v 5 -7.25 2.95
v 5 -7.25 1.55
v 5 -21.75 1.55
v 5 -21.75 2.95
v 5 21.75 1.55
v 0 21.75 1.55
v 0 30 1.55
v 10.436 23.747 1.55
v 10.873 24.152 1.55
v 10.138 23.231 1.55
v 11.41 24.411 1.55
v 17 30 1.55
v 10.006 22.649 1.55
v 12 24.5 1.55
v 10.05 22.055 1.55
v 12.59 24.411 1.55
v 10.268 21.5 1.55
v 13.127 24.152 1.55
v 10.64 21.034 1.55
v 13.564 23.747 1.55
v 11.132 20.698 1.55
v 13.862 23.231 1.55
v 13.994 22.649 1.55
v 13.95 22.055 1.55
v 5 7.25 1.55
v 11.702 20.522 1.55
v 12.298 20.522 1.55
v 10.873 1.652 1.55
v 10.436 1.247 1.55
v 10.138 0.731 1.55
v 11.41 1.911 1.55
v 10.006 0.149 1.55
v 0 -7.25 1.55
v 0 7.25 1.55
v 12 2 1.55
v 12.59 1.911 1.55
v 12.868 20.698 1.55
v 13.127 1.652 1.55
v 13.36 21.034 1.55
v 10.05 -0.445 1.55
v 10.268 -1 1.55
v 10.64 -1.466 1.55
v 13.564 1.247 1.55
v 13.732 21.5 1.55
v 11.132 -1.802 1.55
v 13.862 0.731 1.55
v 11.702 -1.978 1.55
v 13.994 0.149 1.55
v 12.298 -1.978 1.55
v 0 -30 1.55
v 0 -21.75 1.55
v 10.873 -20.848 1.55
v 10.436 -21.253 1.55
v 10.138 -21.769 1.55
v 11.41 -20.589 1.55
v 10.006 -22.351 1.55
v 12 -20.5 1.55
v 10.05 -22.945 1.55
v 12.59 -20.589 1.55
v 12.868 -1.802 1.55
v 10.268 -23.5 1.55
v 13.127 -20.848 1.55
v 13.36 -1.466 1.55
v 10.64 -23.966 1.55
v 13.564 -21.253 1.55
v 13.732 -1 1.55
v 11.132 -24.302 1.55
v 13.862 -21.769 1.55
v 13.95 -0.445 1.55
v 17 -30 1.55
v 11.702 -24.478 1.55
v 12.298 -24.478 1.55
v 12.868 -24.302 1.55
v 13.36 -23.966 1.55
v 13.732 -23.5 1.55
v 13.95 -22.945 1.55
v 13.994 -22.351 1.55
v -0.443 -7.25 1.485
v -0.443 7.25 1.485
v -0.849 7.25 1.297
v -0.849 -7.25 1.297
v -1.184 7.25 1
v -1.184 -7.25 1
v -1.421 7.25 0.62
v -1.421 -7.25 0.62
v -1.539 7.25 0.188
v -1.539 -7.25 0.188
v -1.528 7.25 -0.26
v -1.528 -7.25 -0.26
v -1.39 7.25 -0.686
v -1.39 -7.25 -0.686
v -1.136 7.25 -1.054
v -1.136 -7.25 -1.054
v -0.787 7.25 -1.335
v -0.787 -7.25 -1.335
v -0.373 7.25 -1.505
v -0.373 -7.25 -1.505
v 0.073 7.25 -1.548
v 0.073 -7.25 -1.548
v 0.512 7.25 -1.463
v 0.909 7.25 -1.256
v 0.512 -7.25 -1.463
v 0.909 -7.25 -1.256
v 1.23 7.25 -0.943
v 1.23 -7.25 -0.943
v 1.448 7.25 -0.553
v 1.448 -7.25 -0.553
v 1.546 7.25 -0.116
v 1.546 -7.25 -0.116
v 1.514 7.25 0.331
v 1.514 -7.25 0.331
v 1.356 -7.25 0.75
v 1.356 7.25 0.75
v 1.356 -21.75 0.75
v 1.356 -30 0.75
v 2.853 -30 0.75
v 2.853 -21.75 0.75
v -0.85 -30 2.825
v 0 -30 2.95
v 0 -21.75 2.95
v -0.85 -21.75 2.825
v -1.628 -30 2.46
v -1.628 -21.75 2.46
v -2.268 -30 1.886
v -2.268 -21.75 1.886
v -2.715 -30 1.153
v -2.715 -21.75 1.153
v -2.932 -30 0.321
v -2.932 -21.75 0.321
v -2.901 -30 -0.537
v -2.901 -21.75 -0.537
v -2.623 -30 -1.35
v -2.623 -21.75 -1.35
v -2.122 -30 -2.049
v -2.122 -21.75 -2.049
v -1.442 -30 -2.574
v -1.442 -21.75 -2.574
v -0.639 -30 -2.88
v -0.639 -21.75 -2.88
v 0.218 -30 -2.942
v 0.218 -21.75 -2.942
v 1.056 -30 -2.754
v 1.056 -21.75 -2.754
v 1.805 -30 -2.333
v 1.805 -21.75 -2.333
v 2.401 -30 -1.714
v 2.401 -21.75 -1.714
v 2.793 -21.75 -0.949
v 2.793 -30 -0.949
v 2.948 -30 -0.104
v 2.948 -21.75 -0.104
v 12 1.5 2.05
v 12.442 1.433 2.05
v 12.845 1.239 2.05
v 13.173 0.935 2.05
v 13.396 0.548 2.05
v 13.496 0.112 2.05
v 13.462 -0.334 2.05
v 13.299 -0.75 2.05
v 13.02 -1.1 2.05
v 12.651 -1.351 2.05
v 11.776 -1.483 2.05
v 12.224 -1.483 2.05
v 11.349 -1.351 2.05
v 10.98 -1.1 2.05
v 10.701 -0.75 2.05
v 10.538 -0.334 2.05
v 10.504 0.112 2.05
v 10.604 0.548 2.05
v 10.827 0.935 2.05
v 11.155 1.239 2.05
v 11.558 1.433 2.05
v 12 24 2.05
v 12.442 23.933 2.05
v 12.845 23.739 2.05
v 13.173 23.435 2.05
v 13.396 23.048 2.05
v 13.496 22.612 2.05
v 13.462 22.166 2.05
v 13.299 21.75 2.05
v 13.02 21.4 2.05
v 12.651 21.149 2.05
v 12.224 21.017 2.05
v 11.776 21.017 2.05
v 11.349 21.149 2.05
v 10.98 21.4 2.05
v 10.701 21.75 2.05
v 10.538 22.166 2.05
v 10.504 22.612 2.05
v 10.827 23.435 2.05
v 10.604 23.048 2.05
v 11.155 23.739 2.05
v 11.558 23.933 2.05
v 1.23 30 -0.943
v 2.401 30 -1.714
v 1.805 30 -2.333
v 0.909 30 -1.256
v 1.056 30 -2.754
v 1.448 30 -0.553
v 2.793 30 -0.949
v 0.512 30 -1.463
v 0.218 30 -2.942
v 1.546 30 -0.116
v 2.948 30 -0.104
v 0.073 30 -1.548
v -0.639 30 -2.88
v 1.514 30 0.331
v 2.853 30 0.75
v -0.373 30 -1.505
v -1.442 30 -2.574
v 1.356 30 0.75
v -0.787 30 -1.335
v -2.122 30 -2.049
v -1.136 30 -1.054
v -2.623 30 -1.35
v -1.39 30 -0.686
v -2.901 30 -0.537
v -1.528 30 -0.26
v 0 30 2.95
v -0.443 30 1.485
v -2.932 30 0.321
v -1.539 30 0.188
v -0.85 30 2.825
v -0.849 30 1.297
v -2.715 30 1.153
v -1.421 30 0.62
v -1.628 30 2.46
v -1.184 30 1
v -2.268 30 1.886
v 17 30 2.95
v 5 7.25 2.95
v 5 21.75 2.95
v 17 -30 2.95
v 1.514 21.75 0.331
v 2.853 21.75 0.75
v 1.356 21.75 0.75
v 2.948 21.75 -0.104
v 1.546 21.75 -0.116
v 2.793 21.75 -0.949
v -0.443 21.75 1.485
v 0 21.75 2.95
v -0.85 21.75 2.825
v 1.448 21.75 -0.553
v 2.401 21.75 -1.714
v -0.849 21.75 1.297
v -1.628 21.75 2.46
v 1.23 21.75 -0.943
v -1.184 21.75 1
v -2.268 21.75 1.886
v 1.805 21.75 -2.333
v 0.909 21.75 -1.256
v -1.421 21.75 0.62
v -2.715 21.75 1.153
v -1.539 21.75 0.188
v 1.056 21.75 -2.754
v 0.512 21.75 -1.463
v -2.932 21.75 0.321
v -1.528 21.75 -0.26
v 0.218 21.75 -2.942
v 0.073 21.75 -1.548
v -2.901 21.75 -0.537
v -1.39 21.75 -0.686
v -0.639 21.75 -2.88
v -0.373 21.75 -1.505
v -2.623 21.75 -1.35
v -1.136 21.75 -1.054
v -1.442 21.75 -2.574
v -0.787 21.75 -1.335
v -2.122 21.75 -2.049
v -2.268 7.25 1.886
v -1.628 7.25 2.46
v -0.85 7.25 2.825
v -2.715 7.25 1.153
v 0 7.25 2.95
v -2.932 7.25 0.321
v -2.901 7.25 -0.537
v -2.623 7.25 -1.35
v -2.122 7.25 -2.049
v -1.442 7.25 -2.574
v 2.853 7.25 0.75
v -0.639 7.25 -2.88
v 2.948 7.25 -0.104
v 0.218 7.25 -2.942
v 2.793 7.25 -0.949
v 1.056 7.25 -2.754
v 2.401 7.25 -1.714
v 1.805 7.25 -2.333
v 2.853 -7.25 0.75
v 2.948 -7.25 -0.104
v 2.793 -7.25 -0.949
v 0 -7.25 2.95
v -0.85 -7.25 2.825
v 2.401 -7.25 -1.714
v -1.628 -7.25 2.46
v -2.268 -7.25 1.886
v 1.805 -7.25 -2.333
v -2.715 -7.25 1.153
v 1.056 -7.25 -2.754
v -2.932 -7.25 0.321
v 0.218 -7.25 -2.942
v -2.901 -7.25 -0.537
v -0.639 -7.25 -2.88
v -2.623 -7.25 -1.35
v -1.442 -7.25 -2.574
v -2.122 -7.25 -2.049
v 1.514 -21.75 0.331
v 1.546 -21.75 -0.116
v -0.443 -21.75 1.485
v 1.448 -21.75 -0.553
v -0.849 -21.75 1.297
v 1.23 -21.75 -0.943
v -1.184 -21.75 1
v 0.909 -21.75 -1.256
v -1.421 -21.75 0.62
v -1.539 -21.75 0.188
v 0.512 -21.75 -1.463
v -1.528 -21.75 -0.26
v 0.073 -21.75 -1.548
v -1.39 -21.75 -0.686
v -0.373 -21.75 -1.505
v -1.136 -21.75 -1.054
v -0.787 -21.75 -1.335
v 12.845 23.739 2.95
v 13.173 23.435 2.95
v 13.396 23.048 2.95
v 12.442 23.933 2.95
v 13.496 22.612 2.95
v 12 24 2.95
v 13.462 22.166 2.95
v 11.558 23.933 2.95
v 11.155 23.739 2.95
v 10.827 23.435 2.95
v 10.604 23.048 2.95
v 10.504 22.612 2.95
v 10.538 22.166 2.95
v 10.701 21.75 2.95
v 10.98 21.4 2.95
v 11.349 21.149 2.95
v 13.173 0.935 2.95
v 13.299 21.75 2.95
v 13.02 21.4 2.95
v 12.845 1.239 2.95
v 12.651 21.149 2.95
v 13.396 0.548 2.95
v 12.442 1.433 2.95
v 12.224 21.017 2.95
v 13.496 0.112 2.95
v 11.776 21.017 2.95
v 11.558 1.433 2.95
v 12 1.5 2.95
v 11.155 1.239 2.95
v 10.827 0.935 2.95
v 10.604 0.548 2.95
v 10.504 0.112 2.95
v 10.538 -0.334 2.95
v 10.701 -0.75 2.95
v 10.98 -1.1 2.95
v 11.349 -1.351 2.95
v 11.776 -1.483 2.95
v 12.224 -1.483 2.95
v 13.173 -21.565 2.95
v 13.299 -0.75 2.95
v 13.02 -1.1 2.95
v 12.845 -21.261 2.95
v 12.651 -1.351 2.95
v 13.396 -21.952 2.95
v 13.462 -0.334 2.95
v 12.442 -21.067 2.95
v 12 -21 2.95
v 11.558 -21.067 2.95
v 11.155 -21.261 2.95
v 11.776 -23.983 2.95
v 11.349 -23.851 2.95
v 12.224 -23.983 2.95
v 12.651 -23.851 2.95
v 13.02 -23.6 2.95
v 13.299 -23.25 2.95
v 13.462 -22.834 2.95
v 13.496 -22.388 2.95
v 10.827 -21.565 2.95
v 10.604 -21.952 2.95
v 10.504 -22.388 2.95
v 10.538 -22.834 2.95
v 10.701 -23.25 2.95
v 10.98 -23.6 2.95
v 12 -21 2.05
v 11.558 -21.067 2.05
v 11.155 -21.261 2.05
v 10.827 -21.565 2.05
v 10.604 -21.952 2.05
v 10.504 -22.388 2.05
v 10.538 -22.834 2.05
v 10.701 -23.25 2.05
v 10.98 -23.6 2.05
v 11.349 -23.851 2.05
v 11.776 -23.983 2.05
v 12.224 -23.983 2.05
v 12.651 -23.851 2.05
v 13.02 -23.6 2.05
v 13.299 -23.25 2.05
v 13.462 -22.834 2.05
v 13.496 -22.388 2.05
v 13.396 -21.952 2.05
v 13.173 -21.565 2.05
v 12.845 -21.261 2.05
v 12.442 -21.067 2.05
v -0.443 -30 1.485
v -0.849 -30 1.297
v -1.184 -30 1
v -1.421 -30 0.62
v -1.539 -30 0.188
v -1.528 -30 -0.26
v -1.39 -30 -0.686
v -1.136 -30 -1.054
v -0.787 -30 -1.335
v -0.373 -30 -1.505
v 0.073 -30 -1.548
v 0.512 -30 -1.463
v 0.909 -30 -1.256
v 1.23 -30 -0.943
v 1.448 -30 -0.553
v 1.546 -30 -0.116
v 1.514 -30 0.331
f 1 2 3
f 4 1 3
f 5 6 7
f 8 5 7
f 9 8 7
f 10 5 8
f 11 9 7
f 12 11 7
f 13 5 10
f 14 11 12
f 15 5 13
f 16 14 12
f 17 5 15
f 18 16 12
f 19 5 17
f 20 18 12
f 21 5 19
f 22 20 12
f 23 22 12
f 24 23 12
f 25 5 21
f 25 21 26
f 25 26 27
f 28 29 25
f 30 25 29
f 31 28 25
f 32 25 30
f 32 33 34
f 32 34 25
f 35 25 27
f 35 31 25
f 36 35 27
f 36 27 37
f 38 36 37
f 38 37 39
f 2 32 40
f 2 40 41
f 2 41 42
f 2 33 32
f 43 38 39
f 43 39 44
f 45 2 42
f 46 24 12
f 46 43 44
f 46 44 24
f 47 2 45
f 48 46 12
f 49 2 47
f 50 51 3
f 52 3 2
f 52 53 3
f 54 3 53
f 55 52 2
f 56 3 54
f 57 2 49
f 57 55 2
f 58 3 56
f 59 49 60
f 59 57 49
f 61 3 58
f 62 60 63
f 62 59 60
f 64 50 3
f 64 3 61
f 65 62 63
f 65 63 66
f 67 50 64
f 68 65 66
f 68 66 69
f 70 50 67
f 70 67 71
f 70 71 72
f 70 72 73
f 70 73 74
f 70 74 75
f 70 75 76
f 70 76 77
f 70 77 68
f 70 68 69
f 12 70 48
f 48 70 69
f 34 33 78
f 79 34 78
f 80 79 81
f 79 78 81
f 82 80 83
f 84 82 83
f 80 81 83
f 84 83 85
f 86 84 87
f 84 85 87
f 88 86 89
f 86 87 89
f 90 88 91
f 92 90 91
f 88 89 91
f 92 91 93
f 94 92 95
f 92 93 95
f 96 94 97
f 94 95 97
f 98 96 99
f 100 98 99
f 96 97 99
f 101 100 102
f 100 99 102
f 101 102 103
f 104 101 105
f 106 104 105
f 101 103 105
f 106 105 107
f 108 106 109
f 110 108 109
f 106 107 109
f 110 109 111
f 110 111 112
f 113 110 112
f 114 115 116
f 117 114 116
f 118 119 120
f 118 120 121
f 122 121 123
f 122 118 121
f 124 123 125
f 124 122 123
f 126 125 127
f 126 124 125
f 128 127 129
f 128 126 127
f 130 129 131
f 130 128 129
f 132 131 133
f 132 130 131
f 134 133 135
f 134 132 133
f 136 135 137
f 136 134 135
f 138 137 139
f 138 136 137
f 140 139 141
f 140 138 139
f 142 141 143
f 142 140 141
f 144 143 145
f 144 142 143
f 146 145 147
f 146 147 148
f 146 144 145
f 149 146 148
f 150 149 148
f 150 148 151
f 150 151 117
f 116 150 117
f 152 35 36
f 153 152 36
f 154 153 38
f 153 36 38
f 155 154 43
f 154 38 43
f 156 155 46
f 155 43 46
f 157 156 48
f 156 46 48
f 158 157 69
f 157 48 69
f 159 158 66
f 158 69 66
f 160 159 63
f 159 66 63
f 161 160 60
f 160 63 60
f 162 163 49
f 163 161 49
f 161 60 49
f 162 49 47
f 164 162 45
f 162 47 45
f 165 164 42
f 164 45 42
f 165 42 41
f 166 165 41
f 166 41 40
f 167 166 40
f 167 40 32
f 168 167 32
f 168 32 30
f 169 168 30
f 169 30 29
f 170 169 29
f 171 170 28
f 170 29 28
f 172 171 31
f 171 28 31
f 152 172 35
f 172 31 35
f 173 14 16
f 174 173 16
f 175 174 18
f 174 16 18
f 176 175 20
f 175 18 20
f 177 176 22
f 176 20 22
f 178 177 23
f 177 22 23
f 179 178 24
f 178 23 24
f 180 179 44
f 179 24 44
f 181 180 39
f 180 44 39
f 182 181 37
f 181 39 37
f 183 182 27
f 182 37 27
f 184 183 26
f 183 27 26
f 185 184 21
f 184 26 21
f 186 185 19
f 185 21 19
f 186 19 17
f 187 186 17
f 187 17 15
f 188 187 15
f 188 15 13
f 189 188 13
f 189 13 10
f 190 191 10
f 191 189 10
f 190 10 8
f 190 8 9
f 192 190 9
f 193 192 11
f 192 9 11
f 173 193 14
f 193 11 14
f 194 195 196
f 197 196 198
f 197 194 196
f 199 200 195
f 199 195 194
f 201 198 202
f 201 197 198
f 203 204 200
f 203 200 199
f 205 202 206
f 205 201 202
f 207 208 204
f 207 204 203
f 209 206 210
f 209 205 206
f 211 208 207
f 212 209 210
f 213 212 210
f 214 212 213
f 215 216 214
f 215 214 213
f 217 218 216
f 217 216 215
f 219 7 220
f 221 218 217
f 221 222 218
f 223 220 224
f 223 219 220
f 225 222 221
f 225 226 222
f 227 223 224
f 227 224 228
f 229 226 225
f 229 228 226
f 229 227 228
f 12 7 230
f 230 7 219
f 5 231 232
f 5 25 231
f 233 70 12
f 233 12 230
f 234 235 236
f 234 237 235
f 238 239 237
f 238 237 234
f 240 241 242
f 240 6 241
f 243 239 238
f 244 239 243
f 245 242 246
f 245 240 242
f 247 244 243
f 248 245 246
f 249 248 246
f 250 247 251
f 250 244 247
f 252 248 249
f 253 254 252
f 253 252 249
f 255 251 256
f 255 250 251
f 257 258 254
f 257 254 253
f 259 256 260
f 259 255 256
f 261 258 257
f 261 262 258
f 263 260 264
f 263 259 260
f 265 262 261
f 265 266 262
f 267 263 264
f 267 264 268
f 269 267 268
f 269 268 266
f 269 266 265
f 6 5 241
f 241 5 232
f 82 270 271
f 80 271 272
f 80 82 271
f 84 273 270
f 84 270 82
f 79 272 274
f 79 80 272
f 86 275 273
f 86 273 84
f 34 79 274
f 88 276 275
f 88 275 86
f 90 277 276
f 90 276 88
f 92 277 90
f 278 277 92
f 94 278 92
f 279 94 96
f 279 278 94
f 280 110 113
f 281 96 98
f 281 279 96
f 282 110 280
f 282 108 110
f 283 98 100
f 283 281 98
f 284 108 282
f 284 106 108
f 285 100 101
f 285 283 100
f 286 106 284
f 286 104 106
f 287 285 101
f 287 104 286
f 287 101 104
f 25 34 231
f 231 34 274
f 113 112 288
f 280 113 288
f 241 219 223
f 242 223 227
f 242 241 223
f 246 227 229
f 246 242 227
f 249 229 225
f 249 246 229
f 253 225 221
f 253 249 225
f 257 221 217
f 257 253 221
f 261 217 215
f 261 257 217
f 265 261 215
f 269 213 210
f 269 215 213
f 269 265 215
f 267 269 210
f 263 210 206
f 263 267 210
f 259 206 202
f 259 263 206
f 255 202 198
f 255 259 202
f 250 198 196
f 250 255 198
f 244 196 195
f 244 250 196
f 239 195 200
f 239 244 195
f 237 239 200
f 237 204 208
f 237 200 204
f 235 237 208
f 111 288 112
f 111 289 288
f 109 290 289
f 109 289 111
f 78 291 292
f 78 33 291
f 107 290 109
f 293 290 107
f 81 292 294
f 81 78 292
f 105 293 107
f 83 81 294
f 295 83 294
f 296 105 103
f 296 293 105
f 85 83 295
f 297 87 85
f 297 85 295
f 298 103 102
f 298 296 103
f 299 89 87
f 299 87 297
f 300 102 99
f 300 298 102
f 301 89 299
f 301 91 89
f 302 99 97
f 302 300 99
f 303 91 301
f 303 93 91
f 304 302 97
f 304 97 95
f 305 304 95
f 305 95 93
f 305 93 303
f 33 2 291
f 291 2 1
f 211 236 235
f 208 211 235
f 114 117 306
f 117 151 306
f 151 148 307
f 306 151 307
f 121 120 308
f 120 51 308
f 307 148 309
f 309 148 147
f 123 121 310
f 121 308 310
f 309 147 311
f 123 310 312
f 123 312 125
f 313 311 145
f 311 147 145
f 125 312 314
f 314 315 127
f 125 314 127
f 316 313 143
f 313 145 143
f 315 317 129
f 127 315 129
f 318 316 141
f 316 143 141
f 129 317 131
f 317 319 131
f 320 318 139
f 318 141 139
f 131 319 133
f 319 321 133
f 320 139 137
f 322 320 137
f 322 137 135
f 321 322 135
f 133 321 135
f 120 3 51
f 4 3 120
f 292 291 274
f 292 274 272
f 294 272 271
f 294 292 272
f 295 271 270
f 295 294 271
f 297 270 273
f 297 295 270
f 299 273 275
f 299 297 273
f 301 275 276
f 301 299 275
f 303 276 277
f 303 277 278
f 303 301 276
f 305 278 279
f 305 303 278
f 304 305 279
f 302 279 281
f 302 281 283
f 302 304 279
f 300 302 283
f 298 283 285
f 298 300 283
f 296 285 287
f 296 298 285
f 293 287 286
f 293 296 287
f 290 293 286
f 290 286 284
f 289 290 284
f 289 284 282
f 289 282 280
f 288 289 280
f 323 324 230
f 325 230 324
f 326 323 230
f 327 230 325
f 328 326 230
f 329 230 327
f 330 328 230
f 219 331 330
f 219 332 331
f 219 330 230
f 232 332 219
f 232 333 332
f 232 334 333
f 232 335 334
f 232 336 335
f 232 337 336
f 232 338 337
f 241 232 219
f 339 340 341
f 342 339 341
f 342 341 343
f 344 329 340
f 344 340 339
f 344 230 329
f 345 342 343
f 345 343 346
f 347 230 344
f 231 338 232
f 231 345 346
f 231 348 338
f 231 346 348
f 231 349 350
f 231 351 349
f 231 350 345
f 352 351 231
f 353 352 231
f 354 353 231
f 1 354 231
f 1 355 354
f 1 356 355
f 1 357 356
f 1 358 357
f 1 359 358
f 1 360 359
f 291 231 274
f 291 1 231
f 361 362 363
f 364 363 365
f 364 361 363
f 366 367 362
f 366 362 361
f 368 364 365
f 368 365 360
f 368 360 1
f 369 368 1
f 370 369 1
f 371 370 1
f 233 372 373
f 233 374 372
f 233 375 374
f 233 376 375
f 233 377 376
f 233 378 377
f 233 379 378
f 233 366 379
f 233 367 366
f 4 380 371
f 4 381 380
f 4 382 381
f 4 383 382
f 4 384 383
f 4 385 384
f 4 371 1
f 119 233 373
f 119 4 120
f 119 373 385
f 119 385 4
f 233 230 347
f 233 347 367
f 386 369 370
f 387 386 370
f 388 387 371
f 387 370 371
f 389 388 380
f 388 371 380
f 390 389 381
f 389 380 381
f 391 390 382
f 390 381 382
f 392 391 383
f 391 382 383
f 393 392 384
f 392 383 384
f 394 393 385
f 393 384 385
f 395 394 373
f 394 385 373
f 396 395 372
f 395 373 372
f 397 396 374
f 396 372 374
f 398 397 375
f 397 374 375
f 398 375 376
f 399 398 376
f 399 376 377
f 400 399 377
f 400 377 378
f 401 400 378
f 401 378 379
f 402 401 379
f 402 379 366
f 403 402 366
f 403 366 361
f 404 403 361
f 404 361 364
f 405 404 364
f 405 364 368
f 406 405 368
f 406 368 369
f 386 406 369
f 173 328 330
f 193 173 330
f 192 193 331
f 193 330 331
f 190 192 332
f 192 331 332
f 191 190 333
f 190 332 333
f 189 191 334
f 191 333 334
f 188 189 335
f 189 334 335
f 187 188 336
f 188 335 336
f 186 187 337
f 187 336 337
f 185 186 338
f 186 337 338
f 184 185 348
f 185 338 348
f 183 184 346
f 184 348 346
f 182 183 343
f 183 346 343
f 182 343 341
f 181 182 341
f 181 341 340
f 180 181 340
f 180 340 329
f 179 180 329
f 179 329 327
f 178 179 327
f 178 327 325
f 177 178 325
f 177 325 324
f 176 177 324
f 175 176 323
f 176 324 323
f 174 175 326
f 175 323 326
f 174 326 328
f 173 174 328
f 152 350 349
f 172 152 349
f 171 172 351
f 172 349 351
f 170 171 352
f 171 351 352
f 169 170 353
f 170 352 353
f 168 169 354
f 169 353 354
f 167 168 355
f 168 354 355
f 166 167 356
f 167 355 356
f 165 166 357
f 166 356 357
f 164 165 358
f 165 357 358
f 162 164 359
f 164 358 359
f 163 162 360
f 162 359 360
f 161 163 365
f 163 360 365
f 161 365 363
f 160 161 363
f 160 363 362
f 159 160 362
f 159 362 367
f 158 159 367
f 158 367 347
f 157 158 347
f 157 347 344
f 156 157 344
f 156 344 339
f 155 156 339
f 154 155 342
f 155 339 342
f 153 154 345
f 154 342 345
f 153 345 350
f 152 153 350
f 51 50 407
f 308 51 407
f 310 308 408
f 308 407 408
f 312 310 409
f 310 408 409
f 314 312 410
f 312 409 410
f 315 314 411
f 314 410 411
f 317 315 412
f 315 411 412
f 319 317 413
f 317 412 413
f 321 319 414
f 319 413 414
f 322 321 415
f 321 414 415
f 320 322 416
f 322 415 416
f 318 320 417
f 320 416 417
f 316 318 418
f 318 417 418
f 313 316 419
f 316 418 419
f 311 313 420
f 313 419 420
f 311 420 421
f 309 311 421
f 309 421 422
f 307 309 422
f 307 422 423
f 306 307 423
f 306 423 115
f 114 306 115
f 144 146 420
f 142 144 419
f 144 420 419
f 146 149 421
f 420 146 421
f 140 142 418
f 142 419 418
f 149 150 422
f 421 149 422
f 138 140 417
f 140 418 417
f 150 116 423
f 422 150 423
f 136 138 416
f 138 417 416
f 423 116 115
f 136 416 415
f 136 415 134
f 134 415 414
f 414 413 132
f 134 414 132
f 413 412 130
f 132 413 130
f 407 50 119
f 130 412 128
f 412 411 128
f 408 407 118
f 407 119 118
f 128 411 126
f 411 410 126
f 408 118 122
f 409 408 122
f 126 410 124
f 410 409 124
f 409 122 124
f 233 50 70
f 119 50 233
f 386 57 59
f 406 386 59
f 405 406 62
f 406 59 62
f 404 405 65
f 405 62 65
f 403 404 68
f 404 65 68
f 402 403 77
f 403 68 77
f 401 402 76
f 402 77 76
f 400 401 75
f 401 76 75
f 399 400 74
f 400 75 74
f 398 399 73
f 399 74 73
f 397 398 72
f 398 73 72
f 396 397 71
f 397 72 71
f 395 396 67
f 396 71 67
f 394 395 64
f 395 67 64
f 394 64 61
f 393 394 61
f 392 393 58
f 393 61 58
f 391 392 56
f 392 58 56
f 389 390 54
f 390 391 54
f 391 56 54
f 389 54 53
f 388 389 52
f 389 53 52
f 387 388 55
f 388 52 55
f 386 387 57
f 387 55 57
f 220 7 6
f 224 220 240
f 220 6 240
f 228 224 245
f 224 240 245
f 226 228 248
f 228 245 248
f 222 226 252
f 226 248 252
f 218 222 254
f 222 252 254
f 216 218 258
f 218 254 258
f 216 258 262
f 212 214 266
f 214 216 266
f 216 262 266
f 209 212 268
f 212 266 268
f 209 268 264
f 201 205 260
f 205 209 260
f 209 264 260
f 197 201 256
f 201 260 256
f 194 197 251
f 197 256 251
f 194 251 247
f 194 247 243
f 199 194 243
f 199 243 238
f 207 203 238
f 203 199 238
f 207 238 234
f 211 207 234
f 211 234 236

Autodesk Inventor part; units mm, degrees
ref_plane "YZ Plane" through (0, 0, 0) normal (1, 0, 0) x (0, 1, 0)
ref_plane "XZ Plane" through (0, 0, 0) normal (0, 1, 0) x (-1, 0, 0)
ref_plane "XY Plane" through (0, 0, 0) normal (0, 0, 1) x (1, 0, 0)
sketch "Skizze1" plane through (0, 0, 0) normal (0, 1, 0) x (-1, 0, 0)
  line L0 (0, 0) -> (0, 79.9753) construction
  line L1 (0, 0) -> (-80.4332, 0) construction
  line L2 (0, 0) -> (80.1339, 0) construction
  line L3 (0, 0) -> (0, -79.3949) construction
  line L4 (0, 1.55) -> (-17, 1.55)
  line L5 (-17, 1.55) -> (-17, 2.95)
  line L6 (-17, 2.95) -> (0, 2.95)
  arc A0 (-1.3565, 0.75) -> (0, 1.55) centre (0, 0) ccw
  arc A1 (-2.8531, 0.75) -> (0, 2.95) centre (0, 0) ccw
  line L7 (-1.3565, 0.75) -> (-2.8531, 0.75)
  circle A2 centre (0, 0) radius 1.5
  dimension "d0" = 1.4
  dimension "d1" = 5.9
  dimension "d2" = 0.8
  dimension "d3" = 19.95
  dimension "d21" = 0.05
  dimension "d28" = 17
extrude "Extrusion1" add sketch "Skizze1" along normal mid plane 60 contours L4 L5 L6 A1 L7 A0
sketch "Skizze3" plane through (0, 0, 0) normal (0, 0, 1) x (1, 0, 0)
  line L0 (7.5, -7.25) -> (-7, -7.25)
  line L1 (-7, -7.25) -> (-7, 7.25)
  line L2 (-7, 7.25) -> (7.5, 7.25)
  line L3 (7.5, 7.25) -> (7.5, -7.25)
  line L4 (17, 30) -> (17, -30) construction
  line L5 (-11.8, 0) -> (21.8, 0) construction
  line L6 (-7, -7.25) -> (5, -7.25)
  line L7 (5, -7.25) -> (5, -21.75)
  line L8 (5, -21.75) -> (-7, -21.75)
  line L9 (-7, -21.75) -> (-7, -7.25)
  line L10 (-7, 7.25) -> (5, 7.25)
  line L11 (5, 7.25) -> (5, 21.75)
  line L12 (5, 21.75) -> (-7, 21.75)
  line L13 (-7, 21.75) -> (-7, 7.25)
  point P0 (0, 0)
  dimension "d6" = 9.5
  dimension "d7" = 14.5
  dimension "d8" = 7.25
  dimension "d9" = 14.5
  dimension "d27" = 12
extrude "Extrusion2" cut sketch "Skizze3" along normal through all both and the other way through all contours L7 L8 L9 L0 | L2 L13 L12 L11
sketch "Skizze4" plane through (17, 30, 1.55) normal (0, 0, -1) x (-1, 0, 0)
  line L0 (17, -72) -> (17, 12) projected
  line L1 (-3.99, -30) -> (23.94, -30) construction
  line L2 (5, -7.5) -> (5, -52.5) construction
  line L3 (0, 0) -> (0, -60) construction
  point P0 (17, -30)
  point P1 (5, -30)
  dimension "d12" = 45
  dimension "d13" = 5
hole "Bohrung1" at (12, 22.5, 1.55) at (12, -22.5, 1.55) at (12, 0, 1.55) direction (0, 0, 1) diameter 3 end through all countersink diameter 4 countersink angle 90
extrude "Extrusion3" [suppressed]
chamfer "Fase1" [suppressed]
equation "\"d8\" = 0.5 * d7"
equation "\"d9\" = d7"
